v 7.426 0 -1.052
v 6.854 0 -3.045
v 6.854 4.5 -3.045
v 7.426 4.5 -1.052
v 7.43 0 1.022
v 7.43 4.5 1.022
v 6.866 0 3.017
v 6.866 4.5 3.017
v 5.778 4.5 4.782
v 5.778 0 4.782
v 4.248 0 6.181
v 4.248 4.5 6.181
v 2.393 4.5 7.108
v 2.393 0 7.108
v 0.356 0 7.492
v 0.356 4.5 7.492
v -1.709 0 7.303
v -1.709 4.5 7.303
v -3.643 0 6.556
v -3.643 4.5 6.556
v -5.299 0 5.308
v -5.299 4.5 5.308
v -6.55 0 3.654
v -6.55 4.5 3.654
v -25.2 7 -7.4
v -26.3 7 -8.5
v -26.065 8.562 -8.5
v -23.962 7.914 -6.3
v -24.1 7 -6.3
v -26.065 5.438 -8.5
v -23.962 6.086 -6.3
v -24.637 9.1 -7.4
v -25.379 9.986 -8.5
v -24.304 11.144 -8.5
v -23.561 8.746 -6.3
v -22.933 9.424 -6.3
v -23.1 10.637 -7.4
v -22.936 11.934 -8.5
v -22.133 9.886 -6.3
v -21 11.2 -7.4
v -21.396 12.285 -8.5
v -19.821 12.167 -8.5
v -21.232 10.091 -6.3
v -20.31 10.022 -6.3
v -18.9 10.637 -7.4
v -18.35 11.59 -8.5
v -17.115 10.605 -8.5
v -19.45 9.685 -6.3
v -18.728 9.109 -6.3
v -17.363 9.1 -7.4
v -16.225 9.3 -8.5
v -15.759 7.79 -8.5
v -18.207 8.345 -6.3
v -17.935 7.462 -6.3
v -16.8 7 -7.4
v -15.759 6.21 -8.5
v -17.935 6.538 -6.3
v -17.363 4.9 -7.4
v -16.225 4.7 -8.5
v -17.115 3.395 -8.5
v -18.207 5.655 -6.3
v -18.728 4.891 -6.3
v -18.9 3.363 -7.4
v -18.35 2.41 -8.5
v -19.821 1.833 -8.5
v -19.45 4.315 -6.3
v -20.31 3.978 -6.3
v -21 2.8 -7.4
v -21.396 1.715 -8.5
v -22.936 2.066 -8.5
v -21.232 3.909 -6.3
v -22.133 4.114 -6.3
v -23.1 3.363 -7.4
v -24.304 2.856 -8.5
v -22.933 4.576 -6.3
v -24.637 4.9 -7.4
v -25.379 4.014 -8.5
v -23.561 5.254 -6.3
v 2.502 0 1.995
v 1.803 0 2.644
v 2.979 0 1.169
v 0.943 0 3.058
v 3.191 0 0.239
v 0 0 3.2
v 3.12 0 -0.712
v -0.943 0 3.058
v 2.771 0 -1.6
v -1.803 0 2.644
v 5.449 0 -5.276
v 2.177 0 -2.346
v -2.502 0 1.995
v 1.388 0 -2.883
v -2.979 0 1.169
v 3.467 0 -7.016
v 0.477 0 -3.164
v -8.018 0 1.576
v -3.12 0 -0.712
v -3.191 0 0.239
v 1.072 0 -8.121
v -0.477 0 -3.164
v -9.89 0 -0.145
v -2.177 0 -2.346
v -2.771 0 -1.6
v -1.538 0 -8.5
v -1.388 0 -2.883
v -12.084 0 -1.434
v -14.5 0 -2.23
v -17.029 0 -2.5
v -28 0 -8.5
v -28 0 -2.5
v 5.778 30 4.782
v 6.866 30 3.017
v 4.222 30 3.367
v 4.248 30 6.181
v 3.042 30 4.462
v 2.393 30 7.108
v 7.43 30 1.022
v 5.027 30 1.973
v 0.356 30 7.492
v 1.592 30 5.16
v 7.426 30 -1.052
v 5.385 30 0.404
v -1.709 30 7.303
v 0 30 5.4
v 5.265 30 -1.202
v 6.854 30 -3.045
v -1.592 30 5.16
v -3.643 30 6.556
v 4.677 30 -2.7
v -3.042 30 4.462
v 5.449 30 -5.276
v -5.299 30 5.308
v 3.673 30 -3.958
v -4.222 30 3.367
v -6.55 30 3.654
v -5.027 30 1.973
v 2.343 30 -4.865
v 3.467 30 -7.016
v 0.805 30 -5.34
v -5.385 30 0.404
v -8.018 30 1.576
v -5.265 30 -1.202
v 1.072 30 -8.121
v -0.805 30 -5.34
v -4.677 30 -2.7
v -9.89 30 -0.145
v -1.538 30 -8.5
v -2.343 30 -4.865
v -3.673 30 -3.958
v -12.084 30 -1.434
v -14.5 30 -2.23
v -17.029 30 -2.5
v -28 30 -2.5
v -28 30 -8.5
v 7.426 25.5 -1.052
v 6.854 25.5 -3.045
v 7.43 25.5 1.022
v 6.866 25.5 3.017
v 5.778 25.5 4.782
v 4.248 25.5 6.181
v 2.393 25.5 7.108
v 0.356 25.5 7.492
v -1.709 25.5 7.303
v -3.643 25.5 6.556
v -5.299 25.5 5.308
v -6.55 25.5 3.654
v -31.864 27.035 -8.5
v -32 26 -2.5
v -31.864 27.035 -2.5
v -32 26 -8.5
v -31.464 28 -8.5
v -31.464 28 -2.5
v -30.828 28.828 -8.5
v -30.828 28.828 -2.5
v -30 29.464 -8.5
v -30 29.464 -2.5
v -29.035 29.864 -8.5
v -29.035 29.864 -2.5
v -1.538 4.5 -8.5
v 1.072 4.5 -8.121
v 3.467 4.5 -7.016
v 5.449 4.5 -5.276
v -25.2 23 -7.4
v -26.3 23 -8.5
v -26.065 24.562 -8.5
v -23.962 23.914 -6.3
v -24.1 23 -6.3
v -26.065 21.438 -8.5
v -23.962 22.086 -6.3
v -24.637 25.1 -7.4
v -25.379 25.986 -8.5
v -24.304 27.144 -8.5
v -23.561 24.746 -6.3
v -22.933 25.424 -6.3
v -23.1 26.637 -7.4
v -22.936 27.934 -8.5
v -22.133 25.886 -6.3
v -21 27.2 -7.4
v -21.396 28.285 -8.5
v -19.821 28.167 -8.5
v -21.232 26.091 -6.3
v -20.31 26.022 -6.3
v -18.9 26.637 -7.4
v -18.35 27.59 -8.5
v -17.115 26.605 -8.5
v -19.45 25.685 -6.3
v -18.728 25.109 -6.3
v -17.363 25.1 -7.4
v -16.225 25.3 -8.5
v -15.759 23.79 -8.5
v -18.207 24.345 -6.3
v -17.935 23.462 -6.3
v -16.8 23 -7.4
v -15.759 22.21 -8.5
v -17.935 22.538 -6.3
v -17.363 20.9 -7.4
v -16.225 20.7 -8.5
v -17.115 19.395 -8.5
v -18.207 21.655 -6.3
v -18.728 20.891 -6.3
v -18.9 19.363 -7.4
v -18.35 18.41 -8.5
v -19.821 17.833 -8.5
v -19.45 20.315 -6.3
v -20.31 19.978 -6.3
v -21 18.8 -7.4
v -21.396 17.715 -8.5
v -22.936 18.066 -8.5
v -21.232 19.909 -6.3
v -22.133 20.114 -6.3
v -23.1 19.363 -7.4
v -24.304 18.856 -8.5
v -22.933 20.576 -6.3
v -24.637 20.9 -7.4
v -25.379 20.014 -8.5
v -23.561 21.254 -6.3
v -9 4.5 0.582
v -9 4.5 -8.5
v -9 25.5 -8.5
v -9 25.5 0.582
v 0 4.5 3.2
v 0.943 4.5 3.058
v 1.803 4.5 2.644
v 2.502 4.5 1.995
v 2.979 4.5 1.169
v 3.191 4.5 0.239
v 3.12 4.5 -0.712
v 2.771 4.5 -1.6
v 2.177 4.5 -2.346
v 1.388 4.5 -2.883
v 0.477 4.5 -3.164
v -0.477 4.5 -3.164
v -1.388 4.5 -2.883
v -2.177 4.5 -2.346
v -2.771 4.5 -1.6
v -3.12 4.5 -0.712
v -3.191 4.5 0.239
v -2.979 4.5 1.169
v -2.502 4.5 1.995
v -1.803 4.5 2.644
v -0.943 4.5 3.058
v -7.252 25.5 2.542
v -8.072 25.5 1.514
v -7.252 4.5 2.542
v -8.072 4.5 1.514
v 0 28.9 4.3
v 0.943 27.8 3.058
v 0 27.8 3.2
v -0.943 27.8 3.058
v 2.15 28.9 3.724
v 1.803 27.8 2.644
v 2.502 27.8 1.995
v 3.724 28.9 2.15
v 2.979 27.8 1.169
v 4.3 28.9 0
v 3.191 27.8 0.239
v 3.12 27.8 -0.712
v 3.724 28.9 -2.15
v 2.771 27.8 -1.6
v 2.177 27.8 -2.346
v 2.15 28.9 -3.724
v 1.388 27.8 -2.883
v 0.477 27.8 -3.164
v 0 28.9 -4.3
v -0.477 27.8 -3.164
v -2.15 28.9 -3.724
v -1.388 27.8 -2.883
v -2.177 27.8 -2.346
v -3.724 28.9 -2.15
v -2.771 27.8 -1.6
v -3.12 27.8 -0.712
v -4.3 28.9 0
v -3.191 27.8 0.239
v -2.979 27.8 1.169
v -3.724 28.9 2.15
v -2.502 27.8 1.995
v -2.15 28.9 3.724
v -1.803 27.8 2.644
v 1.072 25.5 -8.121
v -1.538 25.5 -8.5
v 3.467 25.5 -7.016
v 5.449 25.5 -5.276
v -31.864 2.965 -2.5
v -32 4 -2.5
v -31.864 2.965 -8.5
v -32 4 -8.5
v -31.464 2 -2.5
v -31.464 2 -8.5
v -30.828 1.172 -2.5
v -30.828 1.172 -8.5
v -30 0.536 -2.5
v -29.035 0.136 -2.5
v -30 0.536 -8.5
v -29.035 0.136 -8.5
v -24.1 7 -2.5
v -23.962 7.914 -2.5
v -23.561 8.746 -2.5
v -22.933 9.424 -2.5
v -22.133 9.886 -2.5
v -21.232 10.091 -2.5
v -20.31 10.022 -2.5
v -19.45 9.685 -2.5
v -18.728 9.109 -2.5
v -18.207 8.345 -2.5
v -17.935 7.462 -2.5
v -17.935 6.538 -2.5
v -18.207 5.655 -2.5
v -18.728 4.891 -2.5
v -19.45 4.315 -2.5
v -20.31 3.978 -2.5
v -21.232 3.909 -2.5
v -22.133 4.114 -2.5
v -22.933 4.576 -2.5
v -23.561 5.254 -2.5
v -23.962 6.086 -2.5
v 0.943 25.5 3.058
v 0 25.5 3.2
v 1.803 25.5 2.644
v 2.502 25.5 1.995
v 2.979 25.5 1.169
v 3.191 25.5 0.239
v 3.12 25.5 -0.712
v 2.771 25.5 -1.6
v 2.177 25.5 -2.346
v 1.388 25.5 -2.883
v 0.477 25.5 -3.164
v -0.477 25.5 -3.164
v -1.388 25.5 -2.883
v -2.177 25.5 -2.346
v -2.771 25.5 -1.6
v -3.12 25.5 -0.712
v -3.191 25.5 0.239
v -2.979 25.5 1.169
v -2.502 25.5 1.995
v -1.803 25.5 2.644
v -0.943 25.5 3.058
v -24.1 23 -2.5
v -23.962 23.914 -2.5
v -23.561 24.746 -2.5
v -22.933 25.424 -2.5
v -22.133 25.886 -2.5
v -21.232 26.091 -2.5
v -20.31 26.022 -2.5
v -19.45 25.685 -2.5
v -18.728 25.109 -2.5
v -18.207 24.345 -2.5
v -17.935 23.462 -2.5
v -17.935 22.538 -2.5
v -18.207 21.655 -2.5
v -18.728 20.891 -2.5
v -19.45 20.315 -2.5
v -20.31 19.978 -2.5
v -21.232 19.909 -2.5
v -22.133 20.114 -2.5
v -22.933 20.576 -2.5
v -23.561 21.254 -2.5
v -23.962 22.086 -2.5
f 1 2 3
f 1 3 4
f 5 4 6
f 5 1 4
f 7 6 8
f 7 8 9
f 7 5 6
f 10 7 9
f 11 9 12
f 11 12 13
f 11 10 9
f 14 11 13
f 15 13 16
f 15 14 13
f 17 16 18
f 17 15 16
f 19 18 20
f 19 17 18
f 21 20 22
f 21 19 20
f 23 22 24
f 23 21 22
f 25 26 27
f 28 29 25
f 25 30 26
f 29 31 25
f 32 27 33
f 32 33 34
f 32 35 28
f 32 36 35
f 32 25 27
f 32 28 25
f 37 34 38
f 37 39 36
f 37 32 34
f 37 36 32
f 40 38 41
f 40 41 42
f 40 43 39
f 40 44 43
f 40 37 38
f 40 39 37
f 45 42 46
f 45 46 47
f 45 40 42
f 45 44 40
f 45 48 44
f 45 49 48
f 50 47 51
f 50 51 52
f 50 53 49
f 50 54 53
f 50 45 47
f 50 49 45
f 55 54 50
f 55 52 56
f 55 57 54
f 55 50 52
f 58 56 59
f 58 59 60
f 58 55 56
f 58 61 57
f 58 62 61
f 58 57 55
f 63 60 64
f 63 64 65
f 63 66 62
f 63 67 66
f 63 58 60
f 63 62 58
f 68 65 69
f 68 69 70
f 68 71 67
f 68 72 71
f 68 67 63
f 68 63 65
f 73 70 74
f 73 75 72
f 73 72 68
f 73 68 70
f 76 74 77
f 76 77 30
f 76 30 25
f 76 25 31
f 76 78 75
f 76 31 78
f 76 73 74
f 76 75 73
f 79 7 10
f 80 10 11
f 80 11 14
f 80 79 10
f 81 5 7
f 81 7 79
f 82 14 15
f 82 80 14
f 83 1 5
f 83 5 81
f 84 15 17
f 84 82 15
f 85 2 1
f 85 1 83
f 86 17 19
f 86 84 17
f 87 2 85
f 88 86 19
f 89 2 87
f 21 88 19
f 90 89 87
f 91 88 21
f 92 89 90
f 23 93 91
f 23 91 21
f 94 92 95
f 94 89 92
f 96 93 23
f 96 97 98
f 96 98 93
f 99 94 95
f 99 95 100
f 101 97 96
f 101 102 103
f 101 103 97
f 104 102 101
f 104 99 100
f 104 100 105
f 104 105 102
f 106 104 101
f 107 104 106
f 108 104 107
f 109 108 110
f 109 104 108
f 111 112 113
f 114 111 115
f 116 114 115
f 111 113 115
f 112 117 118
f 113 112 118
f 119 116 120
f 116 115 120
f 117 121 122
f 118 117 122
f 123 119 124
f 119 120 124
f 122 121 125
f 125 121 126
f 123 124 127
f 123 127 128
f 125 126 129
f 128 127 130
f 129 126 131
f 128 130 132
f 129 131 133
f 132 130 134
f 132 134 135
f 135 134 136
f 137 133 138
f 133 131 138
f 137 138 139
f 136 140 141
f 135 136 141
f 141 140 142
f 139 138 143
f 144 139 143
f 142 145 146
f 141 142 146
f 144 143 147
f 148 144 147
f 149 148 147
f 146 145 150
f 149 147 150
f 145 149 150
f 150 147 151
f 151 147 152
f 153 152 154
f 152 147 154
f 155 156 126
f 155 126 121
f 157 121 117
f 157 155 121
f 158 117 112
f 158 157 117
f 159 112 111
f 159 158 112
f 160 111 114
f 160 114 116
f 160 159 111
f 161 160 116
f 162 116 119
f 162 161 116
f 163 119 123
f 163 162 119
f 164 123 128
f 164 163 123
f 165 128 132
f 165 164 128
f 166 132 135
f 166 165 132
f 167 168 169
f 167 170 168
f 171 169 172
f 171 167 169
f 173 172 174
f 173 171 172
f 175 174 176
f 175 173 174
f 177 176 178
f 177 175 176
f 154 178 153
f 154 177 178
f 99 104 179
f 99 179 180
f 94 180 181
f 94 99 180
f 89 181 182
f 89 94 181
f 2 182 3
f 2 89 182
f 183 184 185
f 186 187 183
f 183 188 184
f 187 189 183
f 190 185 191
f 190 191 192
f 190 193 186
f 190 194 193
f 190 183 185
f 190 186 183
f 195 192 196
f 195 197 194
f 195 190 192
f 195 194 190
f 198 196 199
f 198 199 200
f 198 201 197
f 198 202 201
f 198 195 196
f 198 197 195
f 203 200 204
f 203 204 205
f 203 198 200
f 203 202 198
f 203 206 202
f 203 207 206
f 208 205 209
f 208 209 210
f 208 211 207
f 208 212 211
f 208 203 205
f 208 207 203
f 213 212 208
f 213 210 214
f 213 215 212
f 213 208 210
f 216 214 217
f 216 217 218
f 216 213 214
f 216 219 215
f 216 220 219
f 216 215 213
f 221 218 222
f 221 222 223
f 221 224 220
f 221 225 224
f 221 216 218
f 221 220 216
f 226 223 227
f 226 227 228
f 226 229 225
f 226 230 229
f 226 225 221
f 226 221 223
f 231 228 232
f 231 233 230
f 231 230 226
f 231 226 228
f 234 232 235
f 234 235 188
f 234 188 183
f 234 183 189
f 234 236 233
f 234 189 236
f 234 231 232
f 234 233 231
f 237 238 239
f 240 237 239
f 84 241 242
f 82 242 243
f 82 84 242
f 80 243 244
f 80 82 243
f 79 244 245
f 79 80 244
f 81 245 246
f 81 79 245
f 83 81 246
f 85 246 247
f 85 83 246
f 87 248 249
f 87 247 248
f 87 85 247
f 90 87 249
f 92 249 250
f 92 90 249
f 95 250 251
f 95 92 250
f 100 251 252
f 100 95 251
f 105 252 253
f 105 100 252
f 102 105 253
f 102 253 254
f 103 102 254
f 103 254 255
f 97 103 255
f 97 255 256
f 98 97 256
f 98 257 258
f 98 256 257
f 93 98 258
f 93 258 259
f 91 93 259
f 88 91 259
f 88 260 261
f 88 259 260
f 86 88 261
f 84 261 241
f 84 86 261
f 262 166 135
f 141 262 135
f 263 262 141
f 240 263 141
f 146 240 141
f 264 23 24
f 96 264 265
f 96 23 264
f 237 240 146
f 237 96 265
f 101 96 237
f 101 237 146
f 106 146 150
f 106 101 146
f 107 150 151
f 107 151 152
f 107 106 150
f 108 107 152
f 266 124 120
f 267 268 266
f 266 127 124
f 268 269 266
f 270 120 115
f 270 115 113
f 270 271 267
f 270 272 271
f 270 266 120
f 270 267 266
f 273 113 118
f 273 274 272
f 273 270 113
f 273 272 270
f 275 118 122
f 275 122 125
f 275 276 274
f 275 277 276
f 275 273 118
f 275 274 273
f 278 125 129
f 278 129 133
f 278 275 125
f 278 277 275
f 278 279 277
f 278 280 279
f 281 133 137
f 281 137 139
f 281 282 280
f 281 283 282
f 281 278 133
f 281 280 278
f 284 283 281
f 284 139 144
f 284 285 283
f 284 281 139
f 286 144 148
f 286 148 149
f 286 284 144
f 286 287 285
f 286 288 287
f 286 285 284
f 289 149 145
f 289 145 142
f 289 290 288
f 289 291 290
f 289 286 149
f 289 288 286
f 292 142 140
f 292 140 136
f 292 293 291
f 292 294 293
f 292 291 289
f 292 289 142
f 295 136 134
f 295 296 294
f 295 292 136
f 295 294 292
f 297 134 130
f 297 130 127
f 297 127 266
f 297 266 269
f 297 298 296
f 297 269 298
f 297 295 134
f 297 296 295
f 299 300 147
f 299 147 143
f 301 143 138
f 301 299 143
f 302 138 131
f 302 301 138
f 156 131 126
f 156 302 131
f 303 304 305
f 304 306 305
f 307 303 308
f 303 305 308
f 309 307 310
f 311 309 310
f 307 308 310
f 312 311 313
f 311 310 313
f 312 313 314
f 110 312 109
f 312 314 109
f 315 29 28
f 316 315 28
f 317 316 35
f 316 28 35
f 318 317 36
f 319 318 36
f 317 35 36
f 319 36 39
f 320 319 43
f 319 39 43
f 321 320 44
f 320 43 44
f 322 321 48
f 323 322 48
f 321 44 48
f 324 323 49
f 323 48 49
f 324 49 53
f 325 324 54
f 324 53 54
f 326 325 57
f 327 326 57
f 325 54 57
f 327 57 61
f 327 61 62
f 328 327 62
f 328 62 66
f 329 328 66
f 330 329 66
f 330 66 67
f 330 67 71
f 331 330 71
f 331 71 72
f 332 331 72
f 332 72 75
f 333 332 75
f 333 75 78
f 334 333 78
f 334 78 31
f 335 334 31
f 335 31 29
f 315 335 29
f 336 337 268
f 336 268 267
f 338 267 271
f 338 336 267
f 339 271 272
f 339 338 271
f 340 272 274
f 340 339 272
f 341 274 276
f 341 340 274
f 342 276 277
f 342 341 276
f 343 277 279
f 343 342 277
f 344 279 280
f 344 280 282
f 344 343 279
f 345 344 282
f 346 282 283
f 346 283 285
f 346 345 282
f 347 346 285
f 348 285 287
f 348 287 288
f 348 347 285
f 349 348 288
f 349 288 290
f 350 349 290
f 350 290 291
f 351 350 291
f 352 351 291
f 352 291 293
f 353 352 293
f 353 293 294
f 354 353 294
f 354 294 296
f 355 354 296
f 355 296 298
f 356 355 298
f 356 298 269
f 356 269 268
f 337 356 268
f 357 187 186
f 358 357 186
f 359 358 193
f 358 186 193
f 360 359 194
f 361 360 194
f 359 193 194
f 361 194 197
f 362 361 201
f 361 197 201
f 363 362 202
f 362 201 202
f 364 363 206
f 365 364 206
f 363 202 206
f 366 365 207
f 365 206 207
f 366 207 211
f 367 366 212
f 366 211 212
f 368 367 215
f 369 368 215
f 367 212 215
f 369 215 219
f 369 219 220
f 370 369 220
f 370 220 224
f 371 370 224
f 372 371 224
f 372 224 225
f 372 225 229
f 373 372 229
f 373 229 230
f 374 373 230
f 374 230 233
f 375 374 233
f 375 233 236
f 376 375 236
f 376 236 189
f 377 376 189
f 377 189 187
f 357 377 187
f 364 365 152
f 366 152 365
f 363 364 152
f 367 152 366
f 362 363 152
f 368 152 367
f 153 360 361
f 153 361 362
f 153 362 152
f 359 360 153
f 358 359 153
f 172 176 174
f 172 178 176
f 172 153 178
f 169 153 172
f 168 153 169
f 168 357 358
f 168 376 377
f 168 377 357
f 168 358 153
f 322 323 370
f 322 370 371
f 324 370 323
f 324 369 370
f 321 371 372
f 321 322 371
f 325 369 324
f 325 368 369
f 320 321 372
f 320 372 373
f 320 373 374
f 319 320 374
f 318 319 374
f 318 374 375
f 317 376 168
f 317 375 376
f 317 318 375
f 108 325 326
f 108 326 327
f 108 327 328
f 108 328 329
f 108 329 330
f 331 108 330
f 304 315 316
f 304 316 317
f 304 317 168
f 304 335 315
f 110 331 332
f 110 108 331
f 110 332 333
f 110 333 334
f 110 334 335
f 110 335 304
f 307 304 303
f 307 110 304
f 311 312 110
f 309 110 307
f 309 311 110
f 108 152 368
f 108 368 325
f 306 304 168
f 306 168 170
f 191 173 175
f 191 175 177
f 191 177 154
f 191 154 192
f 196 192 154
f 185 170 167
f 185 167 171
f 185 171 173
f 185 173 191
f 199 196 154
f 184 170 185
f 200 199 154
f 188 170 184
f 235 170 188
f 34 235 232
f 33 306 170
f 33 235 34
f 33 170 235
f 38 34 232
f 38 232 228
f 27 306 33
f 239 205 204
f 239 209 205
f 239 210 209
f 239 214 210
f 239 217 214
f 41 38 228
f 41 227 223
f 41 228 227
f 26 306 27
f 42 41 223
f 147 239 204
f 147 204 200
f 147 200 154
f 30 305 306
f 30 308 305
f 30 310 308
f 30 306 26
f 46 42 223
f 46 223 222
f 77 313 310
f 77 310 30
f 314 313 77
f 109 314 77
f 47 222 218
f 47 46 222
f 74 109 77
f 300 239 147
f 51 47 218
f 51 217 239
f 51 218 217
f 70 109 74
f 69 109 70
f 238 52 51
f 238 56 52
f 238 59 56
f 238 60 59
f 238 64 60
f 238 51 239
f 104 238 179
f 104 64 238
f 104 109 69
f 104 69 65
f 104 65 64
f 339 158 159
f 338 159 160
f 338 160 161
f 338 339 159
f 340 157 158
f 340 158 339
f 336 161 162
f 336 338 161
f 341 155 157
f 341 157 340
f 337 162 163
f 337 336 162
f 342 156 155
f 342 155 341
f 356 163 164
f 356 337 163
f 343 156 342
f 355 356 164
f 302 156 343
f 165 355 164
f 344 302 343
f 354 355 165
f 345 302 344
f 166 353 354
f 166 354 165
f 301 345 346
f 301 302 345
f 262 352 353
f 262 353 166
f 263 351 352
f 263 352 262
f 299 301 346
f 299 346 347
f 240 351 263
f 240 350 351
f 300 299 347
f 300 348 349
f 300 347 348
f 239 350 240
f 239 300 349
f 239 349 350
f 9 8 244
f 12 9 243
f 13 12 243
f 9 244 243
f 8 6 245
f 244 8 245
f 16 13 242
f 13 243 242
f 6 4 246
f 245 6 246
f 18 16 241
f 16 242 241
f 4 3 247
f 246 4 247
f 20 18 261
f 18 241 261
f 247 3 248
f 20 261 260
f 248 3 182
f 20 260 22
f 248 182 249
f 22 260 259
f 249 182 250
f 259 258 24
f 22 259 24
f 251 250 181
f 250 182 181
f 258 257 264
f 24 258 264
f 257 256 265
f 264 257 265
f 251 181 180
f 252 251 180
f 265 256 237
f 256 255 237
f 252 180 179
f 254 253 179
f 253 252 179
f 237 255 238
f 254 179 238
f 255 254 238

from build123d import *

# Parameters (mm, degrees)
SKETCH_1_R          = 3.2
EXTRUDE_1_DEPTH     = 30
FILLET_1_R          = 4
SKETCH_2_R          = 3.1
CUT_EXTRUDE_1_DEPTH = 47.69047012
SKETCH_3_W          = 22.462925105
SKETCH_3_H          = 21
CUT_EXTRUDE_2_DEPTH = 47.69047012
CHAMFER_1_SIZE      = 2.2
CHAMFER_2_SIZE      = 2.2
CHAMFER_3_SIZE      = 2.2


with BuildPart() as part:
    # Эскиз1 → Бобышка-Вытянуть1 (new body)
    with BuildSketch(Plane(origin=(0, 0, 0), x_dir=(1, 0, 0), z_dir=(0, 1, 0))):
        with BuildLine():
            Line((-32, 8.5), (-1.538396133, 8.5))
            ThreePointArc((-1.538396133, 8.5), (3.466562042, 7.016276971), (6.85424835, 3.044549155))
            ThreePointArc((6.85424835, 3.044549155), (3.352656053, -6.708926694), (-6.549763987, -3.653846154))
            ThreePointArc((-6.549763987, -3.653846154), (-10.952950163, 0.847797982), (-17.029386366, 2.5))
            Line((-17.029386366, 2.5), (-32, 2.5))
            Line((-32, 2.5), (-32, 8.5))
        make_face()
        with Locations(Location((0, 0, 0), (0, 0, 270))):
            Circle(SKETCH_1_R, mode=Mode.SUBTRACT)
    extrude(amount=EXTRUDE_1_DEPTH)

    # Скругление1
    fillet_1_edges = [part.edges().sort_by_distance(p)[0] for p in [
        (-32, 30, -5.5),
        (-32, 0, -5.5),
    ]]
    fillet(fillet_1_edges, radius=FILLET_1_R)

    # Эскиз2 → Вырез-Вытянуть1 (cut, through all)
    with BuildSketch(Plane(origin=(0, 0, -8.5), x_dir=(-1, 0, 0), z_dir=(0, 0, -1))):
        with Locations((21, 23)):
            Circle(SKETCH_2_R)
        with Locations((21, 7)):
            Circle(SKETCH_2_R)
    extrude(amount=-CUT_EXTRUDE_1_DEPTH, mode=Mode.SUBTRACT)

    # Эскиз3 → Вырез-Вытянуть2 (cut, through all)
    with BuildSketch(Plane(origin=(0, 0, -8.5), x_dir=(-1, 0, 0), z_dir=(0, 0, -1))):
        with Locations((-2.231462553, 15)):
            Rectangle(SKETCH_3_W, SKETCH_3_H)
    extrude(amount=-CUT_EXTRUDE_2_DEPTH, mode=Mode.SUBTRACT)

    # Фаска1
    chamfer_1_edges = [part.edges().sort_by_distance(p)[0] for p in [
        (0, 30, -3.2),
    ]]
    chamfer(chamfer_1_edges, length=CHAMFER_1_SIZE)

    # Фаска2
    chamfer_2_edges = [part.edges().sort_by_distance(p)[0] for p in [
        (-17.9, 23, -8.5),
    ]]
    chamfer(chamfer_2_edges, length=CHAMFER_2_SIZE)

    # Фаска3
    chamfer_3_edges = [part.edges().sort_by_distance(p)[0] for p in [
        (-17.9, 7, -8.5),
    ]]
    chamfer(chamfer_3_edges, length=CHAMFER_3_SIZE)


solid = part.part
